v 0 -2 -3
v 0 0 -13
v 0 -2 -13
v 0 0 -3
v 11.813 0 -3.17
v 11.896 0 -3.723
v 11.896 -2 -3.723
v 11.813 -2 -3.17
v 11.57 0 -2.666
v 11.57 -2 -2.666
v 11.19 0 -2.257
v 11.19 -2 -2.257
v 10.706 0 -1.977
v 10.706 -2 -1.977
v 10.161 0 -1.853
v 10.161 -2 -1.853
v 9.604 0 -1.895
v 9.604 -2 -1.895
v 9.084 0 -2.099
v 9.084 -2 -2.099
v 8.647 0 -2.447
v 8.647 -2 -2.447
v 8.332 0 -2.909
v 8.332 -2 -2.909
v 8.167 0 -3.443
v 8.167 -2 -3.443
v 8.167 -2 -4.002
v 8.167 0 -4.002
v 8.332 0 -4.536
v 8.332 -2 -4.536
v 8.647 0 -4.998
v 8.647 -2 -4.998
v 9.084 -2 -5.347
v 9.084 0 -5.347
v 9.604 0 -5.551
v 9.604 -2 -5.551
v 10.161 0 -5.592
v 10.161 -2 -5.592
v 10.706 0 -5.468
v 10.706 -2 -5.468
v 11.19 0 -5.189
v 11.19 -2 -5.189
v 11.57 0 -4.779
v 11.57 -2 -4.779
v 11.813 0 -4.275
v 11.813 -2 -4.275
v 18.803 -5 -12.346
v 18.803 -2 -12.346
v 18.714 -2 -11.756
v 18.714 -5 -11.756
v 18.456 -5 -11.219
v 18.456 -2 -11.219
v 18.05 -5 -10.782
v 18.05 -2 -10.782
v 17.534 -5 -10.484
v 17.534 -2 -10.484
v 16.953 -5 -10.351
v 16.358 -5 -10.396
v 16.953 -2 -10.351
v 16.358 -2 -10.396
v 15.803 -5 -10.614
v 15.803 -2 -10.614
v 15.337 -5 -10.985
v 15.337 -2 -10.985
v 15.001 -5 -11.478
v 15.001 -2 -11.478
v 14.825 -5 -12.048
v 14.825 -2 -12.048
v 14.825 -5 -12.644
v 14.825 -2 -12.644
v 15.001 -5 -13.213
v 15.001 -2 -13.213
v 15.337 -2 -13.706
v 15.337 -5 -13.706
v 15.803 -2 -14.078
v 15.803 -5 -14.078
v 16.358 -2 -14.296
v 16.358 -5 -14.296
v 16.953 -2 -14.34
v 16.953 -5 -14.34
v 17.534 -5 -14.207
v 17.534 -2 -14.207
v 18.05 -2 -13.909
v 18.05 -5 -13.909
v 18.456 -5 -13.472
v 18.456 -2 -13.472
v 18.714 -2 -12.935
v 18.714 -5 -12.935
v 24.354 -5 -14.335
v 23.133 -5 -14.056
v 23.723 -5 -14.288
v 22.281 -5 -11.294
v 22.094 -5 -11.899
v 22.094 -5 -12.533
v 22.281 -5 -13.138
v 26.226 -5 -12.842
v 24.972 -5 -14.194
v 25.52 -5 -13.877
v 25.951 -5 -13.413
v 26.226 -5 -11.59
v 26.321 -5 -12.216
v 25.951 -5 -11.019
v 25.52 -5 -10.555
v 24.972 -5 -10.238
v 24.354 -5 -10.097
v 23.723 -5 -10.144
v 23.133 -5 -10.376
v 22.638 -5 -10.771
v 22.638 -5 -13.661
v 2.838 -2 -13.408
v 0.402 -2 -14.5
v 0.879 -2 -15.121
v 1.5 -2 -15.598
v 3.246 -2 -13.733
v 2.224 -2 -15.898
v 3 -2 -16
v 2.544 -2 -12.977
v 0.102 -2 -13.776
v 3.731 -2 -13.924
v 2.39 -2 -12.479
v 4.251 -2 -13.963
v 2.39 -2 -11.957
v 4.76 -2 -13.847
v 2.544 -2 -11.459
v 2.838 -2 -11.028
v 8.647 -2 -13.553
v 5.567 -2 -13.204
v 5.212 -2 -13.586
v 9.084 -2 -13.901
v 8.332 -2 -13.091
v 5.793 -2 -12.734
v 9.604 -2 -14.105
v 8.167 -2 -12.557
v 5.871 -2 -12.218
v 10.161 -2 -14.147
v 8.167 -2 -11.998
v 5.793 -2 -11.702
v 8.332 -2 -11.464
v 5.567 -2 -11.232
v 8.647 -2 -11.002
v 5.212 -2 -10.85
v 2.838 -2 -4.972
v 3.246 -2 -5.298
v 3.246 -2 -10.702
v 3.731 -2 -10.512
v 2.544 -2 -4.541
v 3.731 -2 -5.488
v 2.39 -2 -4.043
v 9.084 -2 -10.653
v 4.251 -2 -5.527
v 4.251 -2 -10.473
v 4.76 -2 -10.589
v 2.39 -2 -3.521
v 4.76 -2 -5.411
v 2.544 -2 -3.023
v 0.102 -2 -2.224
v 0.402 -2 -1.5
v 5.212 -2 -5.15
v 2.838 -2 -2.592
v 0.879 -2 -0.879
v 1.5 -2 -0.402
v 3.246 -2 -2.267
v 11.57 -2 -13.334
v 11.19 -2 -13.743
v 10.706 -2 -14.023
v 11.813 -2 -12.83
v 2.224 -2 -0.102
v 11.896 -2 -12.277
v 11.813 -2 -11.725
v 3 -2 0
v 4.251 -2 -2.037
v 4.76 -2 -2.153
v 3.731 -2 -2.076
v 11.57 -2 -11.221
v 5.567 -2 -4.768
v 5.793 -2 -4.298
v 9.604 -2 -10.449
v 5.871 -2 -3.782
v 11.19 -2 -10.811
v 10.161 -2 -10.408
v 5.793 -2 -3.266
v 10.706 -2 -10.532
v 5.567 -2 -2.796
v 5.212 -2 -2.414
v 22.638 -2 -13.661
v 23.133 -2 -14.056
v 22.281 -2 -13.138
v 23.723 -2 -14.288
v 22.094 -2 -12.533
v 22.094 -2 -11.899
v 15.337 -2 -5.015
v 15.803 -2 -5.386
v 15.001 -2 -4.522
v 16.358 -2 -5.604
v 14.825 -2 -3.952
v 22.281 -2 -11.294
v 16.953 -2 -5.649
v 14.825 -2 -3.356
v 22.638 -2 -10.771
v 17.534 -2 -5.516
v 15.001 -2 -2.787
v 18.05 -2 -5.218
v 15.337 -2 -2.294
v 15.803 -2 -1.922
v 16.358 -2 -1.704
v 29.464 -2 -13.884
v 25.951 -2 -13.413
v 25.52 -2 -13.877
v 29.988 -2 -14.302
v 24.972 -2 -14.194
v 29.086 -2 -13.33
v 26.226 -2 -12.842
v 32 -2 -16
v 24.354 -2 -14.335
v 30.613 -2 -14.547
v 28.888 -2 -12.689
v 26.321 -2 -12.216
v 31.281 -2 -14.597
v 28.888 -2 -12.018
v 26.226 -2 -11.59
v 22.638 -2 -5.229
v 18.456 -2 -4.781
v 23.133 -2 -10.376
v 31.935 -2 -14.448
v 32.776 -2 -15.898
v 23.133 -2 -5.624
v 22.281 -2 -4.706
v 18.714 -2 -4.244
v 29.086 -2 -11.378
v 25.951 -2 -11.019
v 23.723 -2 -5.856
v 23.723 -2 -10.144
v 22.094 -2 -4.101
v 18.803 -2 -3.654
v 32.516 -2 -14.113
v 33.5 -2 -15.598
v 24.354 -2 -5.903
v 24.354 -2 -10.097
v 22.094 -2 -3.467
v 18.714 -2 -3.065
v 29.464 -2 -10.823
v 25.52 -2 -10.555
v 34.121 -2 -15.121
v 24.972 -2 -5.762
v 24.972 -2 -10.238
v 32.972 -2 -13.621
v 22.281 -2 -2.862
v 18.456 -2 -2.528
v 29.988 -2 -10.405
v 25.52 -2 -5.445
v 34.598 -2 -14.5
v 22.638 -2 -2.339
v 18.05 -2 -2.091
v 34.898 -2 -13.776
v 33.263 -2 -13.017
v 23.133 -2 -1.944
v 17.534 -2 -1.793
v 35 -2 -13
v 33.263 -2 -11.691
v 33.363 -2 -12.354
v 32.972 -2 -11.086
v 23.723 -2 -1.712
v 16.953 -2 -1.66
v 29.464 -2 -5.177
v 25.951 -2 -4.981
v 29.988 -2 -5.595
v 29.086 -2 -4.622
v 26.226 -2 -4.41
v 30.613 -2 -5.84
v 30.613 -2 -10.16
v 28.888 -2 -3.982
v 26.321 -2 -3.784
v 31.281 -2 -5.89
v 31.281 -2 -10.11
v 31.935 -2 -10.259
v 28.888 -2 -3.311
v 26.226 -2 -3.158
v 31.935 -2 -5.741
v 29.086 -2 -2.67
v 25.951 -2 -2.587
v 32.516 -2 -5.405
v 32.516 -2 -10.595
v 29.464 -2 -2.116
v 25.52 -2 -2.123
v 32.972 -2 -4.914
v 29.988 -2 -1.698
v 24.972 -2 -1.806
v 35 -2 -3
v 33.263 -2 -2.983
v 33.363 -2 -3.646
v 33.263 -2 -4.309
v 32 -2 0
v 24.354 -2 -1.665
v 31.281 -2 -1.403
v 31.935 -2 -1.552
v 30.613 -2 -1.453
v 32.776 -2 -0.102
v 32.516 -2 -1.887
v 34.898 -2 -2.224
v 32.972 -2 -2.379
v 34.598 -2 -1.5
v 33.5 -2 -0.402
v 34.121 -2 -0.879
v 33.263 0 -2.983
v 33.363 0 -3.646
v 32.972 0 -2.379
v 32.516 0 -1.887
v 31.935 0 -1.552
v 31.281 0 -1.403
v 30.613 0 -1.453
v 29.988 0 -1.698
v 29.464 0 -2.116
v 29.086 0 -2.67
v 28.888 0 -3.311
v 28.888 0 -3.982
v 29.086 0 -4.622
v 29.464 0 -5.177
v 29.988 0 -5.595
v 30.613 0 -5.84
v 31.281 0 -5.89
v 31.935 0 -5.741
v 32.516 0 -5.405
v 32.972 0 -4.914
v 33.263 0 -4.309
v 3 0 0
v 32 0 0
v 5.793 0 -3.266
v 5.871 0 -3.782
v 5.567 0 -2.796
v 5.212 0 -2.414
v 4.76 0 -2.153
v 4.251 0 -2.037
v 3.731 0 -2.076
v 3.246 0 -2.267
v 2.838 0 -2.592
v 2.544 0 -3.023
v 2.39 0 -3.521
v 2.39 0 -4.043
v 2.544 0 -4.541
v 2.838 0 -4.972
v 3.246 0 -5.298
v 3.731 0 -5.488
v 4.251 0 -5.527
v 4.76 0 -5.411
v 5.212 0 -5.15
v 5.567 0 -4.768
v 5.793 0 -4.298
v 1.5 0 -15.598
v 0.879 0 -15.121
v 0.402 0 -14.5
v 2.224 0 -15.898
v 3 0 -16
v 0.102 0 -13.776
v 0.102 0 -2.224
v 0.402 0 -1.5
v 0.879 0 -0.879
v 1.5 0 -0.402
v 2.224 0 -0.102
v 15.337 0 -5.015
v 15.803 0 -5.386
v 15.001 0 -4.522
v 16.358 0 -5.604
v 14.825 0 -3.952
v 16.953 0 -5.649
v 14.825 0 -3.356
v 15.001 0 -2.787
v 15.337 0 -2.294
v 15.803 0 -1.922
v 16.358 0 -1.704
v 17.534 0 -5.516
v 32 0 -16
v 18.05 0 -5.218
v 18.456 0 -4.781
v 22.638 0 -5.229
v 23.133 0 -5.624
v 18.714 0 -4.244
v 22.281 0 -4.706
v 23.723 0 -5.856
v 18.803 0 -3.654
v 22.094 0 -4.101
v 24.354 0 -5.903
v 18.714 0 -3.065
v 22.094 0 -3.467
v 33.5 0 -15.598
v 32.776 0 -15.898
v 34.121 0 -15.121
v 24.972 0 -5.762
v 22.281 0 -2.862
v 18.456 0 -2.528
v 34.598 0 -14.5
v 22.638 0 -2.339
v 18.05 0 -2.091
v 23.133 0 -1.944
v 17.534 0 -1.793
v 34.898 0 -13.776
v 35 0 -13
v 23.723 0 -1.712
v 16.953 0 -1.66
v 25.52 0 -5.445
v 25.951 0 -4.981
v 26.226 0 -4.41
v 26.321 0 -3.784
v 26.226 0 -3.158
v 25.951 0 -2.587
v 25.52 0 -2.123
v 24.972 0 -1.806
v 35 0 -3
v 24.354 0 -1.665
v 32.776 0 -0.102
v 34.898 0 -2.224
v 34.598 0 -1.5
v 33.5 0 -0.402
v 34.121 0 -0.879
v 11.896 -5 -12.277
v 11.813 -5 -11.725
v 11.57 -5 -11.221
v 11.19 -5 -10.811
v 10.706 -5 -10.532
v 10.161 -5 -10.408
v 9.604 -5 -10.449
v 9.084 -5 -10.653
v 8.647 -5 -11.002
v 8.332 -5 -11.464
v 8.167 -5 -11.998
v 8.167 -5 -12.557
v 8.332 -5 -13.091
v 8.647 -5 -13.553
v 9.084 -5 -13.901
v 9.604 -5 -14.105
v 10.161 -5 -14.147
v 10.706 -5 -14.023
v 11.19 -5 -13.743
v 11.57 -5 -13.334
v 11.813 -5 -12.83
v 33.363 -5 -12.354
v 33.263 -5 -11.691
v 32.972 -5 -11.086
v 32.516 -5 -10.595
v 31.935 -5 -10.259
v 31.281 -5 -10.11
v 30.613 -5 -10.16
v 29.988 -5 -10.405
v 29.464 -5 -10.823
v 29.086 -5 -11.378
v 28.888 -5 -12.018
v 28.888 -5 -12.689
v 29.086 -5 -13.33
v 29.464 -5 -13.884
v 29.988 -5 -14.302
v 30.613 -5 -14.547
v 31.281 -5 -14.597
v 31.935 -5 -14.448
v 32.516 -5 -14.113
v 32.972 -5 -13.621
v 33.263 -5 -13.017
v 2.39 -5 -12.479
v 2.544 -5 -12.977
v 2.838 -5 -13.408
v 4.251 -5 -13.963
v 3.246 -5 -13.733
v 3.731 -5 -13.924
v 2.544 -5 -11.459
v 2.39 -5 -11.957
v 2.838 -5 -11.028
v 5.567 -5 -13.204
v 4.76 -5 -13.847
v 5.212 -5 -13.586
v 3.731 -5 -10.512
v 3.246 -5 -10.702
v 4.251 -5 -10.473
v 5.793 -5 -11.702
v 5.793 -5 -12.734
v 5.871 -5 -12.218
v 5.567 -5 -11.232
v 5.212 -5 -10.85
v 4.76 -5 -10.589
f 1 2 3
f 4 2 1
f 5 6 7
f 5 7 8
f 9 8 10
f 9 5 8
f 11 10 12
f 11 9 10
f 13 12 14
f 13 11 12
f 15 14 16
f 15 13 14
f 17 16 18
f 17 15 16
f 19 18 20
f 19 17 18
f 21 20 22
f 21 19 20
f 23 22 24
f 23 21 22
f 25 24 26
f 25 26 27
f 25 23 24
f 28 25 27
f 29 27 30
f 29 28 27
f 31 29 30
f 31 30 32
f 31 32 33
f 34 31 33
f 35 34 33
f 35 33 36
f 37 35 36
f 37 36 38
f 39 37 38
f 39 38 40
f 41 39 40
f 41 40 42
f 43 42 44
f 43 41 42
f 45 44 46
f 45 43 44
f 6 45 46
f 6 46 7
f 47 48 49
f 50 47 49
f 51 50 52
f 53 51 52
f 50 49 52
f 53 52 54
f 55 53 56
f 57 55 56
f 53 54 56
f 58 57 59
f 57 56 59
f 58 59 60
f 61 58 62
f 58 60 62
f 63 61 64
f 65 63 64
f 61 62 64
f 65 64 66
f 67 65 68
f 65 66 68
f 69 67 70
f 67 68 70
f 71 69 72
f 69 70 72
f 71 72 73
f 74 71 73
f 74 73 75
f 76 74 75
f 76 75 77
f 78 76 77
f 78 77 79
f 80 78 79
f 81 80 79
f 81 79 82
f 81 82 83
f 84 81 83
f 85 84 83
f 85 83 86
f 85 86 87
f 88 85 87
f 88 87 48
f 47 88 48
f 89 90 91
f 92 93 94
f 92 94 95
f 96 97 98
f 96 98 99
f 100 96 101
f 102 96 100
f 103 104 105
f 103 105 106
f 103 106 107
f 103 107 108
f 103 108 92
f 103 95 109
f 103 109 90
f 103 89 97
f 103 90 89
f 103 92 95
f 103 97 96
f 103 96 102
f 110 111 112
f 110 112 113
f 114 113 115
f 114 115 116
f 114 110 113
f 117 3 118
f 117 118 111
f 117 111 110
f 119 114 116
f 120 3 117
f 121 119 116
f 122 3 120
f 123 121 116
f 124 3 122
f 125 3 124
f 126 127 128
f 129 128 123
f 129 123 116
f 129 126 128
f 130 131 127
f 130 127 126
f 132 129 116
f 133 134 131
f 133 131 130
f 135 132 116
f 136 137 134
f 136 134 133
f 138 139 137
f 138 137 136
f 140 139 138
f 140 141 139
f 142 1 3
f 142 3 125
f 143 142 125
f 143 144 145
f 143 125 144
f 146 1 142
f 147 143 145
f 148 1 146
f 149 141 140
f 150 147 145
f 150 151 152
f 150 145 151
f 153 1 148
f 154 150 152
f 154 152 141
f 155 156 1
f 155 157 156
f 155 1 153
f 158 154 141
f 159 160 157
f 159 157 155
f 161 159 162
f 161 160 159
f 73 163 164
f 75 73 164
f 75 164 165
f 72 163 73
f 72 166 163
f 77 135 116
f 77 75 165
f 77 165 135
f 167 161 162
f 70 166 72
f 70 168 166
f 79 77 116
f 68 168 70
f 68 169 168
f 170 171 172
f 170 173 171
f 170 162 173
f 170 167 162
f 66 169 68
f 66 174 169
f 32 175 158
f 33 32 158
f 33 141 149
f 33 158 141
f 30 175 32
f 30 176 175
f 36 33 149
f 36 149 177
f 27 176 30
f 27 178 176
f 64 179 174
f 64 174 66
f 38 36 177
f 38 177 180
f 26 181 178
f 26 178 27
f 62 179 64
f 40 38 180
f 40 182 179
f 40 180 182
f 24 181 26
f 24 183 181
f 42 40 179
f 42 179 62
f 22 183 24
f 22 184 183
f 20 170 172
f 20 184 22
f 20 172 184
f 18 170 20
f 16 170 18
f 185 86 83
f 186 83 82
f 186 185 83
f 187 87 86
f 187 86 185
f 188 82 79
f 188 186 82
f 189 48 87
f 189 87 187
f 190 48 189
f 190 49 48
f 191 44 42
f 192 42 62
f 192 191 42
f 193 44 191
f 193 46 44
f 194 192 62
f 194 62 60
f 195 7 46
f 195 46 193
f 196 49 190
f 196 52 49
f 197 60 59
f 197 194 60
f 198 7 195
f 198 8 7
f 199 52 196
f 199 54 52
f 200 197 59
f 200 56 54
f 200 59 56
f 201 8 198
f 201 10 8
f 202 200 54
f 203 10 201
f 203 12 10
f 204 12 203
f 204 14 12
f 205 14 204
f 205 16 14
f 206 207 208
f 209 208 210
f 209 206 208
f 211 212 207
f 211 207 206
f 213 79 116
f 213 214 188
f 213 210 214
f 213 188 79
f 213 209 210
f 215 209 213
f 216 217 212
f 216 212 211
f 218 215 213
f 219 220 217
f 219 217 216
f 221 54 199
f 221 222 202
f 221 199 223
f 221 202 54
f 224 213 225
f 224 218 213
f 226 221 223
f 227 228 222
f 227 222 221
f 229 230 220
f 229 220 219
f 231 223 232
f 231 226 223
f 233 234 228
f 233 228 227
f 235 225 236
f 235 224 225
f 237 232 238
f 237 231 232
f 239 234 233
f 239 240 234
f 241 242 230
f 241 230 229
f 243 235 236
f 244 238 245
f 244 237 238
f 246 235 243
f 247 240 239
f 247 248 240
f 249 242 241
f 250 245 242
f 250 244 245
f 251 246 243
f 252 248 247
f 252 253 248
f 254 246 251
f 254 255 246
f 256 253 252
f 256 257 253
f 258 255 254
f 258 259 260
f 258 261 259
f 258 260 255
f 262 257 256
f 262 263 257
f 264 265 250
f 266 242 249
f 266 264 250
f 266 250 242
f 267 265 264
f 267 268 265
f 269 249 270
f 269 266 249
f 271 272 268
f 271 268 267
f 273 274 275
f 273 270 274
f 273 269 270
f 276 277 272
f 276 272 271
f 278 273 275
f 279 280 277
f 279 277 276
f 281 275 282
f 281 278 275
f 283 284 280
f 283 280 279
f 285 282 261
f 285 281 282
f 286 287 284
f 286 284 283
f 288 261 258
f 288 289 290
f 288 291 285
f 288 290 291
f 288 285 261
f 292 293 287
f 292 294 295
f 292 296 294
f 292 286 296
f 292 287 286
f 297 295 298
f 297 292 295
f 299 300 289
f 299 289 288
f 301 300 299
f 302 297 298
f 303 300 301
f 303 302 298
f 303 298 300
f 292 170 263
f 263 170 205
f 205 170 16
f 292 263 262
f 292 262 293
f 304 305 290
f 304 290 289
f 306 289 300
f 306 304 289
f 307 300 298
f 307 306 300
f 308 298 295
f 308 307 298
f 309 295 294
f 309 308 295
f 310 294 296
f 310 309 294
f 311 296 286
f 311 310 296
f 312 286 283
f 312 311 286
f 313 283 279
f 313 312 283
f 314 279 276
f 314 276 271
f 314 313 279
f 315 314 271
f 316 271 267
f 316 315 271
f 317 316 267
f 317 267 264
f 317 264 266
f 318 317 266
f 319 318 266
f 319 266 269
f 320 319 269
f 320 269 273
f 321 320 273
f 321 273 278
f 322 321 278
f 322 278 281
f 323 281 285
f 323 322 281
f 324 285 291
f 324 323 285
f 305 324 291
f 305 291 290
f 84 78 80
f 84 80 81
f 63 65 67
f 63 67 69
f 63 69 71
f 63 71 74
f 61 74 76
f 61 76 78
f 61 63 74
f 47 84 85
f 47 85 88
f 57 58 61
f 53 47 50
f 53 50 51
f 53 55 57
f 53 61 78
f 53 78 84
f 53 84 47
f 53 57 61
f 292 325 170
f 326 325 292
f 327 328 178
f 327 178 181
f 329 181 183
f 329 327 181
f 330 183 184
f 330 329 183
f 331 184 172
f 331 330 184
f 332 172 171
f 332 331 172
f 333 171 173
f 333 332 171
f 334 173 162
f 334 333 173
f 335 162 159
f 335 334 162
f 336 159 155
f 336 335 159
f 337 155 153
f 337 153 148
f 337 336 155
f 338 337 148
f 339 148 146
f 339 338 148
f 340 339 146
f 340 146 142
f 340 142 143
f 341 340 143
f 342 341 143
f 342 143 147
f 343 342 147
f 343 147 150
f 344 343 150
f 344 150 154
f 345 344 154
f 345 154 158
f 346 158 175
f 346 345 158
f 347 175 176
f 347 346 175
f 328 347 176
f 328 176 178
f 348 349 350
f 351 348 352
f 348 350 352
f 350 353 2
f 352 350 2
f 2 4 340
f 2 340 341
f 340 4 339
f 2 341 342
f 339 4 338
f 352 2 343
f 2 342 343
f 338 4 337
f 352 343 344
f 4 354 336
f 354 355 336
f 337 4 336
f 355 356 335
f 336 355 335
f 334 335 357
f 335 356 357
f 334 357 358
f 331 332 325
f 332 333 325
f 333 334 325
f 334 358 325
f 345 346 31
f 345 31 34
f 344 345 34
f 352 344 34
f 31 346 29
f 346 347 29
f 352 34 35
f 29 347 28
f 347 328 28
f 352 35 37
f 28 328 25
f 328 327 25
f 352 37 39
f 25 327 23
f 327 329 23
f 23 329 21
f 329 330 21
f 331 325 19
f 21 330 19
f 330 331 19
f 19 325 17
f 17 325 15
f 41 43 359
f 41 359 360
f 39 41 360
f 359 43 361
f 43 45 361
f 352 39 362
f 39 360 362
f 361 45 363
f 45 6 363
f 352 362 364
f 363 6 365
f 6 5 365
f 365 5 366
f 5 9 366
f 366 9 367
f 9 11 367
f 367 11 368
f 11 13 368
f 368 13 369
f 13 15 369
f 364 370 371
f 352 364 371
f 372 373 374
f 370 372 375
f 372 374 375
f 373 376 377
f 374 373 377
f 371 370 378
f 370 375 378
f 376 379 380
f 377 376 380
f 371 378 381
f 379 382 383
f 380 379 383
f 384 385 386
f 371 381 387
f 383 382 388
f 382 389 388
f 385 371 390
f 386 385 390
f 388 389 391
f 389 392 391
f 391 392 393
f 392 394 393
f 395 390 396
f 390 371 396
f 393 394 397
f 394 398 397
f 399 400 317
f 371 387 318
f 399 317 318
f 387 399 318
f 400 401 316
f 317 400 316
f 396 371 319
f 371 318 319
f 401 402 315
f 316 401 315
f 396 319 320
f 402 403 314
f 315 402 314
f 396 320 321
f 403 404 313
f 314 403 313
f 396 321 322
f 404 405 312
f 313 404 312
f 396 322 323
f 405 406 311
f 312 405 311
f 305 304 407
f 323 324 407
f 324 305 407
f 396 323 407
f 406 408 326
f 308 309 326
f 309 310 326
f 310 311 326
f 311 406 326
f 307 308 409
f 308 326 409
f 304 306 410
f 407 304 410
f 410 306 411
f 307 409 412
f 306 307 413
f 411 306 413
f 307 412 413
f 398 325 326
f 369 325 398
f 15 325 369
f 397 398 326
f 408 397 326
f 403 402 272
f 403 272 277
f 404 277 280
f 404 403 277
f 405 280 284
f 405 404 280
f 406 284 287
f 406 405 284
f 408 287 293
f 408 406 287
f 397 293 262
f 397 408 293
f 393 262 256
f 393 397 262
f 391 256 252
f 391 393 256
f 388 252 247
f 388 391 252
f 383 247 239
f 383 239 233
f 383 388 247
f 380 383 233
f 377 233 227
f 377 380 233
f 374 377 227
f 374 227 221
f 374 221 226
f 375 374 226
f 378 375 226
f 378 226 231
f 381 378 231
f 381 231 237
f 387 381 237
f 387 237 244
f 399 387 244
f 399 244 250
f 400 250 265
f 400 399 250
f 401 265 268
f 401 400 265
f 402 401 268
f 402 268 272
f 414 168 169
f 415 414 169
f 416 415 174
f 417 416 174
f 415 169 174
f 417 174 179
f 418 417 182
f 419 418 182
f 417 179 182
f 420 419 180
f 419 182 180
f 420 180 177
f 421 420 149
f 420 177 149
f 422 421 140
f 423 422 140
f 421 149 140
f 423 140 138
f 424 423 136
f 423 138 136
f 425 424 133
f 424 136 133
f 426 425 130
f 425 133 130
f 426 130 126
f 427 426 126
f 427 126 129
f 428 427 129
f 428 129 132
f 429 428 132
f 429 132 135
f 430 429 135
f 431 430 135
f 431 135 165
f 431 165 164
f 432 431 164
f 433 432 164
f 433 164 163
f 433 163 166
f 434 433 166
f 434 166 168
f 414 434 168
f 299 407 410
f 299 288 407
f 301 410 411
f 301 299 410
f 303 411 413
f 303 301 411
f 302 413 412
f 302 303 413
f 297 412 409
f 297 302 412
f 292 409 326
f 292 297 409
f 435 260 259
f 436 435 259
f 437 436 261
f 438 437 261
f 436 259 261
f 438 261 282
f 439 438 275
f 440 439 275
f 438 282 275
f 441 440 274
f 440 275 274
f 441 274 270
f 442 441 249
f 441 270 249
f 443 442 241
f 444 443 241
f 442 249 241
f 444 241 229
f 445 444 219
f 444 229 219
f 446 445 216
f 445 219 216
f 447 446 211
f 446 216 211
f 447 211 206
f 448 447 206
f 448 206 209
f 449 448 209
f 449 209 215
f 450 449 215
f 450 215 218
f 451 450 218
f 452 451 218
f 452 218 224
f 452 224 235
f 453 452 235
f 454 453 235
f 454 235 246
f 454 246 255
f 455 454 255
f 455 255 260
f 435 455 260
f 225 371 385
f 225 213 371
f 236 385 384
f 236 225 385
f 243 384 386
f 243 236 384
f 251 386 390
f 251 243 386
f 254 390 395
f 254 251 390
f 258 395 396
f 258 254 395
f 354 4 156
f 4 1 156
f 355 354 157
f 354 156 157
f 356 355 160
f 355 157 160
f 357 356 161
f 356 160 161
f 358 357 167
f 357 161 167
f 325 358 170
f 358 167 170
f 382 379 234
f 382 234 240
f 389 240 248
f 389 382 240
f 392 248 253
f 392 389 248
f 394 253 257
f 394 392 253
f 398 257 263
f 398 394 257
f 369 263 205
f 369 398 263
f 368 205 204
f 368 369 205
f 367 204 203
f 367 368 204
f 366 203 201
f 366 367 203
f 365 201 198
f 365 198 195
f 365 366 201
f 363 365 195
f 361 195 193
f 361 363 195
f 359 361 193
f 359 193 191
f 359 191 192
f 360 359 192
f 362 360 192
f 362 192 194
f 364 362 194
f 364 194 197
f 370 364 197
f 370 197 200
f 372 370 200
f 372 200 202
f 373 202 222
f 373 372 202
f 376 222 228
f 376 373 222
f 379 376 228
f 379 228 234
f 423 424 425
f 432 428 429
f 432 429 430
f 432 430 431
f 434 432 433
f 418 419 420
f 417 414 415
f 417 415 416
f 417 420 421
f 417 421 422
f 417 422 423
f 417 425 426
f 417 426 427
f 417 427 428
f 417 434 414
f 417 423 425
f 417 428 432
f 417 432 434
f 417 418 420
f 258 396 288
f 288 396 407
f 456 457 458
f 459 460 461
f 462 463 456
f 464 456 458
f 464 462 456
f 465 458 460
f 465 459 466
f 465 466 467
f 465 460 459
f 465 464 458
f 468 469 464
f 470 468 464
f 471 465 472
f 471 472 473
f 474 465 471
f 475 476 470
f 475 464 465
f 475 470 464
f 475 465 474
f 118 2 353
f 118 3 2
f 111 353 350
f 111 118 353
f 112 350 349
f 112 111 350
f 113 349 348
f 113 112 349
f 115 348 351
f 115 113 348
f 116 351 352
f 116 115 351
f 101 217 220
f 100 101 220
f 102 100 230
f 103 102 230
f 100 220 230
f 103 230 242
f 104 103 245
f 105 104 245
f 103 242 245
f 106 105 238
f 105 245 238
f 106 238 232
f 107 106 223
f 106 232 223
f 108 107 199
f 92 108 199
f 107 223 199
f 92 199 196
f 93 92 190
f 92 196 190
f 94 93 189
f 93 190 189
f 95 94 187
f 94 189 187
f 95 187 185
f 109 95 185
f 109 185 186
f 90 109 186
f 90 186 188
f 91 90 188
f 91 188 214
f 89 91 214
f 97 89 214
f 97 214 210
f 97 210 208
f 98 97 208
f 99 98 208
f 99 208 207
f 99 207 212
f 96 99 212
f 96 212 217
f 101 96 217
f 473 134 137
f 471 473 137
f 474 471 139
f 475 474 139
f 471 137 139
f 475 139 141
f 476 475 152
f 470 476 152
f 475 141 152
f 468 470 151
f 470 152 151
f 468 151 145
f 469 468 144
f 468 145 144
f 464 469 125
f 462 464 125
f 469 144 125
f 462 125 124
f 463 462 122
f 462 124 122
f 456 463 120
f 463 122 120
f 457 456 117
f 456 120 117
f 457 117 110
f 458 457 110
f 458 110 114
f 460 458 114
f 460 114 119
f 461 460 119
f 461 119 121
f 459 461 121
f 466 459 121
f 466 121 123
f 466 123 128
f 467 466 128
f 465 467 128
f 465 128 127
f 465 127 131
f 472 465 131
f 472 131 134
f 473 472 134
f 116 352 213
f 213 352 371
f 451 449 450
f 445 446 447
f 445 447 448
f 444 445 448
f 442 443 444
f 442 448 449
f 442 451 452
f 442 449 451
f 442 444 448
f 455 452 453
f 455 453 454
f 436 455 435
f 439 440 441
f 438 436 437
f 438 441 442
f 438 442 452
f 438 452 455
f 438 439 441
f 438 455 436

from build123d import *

# Parameters (mm, degrees)
F0_W     = 35
F0_H     = 8
F0_R     = 1.75
F0_R_2   = 1.875
F0_R_3   = 2
F0_R_4   = 2.125
F0_R_5   = 2.25
F1_DEPTH = 2
F2_DEPTH = 2
F3_DEPTH = 5
F4_R     = 3


with BuildPart() as f1:
    # F0 (on Front) → F1 (new body)
    with BuildSketch(Plane.XZ):
        with Locations((17.5, -4)):
            Rectangle(F0_W, F0_H)
        with Locations((4.12062, -3.782185)):
            Circle(F0_R, mode=Mode.SUBTRACT)
        with Locations((10.021019, -3.722706)):
            Circle(F0_R_2, mode=Mode.SUBTRACT)
        with Locations((16.803088, -3.65434)):
            Circle(F0_R_3, mode=Mode.SUBTRACT)
        with Locations((24.195543, -3.784031)):
            Circle(F0_R_4, mode=Mode.SUBTRACT)
        with Locations((31.113254, -3.646227)):
            Circle(F0_R_5, mode=Mode.SUBTRACT)
    extrude(amount=F1_DEPTH)

    # F0 (on Front) → F2 (join)
    with BuildSketch(Plane.XZ):
        with Locations((17.5, -12)):
            Rectangle(F0_W, F0_H)
        with Locations((4.12062, -12.217815)):
            Circle(F0_R, mode=Mode.SUBTRACT)
        with Locations((10.021019, -12.277294)):
            Circle(F0_R_2, mode=Mode.SUBTRACT)
        with Locations((16.803088, -12.34566)):
            Circle(F0_R_3, mode=Mode.SUBTRACT)
        with Locations((24.195543, -12.215969)):
            Circle(F0_R_4, mode=Mode.SUBTRACT)
        with Locations((31.113254, -12.353773)):
            Circle(F0_R_5, mode=Mode.SUBTRACT)
    extrude(amount=F2_DEPTH)

    # F0 (on Front) → F3 (join)
    with BuildSketch(Plane.XZ):
        with Locations((31.113254, -12.353773)):
            Circle(F0_R_5)
        with Locations((24.195543, -12.215969)):
            Circle(F0_R_4)
        with Locations((16.803088, -12.34566)):
            Circle(F0_R_3)
        with Locations((10.021019, -12.277294)):
            Circle(F0_R_2)
        with Locations((4.12062, -12.217815)):
            Circle(F0_R)
    extrude(amount=F3_DEPTH)

    # F4
    f4_edges = [f1.edges().sort_by_distance(p)[0] for p in [
        (0, -1, 0),
        (0, -1, -16),
        (35, -1, -16),
        (35, -1, 0),
    ]]
    fillet(f4_edges, radius=F4_R)


solid = f1.part
